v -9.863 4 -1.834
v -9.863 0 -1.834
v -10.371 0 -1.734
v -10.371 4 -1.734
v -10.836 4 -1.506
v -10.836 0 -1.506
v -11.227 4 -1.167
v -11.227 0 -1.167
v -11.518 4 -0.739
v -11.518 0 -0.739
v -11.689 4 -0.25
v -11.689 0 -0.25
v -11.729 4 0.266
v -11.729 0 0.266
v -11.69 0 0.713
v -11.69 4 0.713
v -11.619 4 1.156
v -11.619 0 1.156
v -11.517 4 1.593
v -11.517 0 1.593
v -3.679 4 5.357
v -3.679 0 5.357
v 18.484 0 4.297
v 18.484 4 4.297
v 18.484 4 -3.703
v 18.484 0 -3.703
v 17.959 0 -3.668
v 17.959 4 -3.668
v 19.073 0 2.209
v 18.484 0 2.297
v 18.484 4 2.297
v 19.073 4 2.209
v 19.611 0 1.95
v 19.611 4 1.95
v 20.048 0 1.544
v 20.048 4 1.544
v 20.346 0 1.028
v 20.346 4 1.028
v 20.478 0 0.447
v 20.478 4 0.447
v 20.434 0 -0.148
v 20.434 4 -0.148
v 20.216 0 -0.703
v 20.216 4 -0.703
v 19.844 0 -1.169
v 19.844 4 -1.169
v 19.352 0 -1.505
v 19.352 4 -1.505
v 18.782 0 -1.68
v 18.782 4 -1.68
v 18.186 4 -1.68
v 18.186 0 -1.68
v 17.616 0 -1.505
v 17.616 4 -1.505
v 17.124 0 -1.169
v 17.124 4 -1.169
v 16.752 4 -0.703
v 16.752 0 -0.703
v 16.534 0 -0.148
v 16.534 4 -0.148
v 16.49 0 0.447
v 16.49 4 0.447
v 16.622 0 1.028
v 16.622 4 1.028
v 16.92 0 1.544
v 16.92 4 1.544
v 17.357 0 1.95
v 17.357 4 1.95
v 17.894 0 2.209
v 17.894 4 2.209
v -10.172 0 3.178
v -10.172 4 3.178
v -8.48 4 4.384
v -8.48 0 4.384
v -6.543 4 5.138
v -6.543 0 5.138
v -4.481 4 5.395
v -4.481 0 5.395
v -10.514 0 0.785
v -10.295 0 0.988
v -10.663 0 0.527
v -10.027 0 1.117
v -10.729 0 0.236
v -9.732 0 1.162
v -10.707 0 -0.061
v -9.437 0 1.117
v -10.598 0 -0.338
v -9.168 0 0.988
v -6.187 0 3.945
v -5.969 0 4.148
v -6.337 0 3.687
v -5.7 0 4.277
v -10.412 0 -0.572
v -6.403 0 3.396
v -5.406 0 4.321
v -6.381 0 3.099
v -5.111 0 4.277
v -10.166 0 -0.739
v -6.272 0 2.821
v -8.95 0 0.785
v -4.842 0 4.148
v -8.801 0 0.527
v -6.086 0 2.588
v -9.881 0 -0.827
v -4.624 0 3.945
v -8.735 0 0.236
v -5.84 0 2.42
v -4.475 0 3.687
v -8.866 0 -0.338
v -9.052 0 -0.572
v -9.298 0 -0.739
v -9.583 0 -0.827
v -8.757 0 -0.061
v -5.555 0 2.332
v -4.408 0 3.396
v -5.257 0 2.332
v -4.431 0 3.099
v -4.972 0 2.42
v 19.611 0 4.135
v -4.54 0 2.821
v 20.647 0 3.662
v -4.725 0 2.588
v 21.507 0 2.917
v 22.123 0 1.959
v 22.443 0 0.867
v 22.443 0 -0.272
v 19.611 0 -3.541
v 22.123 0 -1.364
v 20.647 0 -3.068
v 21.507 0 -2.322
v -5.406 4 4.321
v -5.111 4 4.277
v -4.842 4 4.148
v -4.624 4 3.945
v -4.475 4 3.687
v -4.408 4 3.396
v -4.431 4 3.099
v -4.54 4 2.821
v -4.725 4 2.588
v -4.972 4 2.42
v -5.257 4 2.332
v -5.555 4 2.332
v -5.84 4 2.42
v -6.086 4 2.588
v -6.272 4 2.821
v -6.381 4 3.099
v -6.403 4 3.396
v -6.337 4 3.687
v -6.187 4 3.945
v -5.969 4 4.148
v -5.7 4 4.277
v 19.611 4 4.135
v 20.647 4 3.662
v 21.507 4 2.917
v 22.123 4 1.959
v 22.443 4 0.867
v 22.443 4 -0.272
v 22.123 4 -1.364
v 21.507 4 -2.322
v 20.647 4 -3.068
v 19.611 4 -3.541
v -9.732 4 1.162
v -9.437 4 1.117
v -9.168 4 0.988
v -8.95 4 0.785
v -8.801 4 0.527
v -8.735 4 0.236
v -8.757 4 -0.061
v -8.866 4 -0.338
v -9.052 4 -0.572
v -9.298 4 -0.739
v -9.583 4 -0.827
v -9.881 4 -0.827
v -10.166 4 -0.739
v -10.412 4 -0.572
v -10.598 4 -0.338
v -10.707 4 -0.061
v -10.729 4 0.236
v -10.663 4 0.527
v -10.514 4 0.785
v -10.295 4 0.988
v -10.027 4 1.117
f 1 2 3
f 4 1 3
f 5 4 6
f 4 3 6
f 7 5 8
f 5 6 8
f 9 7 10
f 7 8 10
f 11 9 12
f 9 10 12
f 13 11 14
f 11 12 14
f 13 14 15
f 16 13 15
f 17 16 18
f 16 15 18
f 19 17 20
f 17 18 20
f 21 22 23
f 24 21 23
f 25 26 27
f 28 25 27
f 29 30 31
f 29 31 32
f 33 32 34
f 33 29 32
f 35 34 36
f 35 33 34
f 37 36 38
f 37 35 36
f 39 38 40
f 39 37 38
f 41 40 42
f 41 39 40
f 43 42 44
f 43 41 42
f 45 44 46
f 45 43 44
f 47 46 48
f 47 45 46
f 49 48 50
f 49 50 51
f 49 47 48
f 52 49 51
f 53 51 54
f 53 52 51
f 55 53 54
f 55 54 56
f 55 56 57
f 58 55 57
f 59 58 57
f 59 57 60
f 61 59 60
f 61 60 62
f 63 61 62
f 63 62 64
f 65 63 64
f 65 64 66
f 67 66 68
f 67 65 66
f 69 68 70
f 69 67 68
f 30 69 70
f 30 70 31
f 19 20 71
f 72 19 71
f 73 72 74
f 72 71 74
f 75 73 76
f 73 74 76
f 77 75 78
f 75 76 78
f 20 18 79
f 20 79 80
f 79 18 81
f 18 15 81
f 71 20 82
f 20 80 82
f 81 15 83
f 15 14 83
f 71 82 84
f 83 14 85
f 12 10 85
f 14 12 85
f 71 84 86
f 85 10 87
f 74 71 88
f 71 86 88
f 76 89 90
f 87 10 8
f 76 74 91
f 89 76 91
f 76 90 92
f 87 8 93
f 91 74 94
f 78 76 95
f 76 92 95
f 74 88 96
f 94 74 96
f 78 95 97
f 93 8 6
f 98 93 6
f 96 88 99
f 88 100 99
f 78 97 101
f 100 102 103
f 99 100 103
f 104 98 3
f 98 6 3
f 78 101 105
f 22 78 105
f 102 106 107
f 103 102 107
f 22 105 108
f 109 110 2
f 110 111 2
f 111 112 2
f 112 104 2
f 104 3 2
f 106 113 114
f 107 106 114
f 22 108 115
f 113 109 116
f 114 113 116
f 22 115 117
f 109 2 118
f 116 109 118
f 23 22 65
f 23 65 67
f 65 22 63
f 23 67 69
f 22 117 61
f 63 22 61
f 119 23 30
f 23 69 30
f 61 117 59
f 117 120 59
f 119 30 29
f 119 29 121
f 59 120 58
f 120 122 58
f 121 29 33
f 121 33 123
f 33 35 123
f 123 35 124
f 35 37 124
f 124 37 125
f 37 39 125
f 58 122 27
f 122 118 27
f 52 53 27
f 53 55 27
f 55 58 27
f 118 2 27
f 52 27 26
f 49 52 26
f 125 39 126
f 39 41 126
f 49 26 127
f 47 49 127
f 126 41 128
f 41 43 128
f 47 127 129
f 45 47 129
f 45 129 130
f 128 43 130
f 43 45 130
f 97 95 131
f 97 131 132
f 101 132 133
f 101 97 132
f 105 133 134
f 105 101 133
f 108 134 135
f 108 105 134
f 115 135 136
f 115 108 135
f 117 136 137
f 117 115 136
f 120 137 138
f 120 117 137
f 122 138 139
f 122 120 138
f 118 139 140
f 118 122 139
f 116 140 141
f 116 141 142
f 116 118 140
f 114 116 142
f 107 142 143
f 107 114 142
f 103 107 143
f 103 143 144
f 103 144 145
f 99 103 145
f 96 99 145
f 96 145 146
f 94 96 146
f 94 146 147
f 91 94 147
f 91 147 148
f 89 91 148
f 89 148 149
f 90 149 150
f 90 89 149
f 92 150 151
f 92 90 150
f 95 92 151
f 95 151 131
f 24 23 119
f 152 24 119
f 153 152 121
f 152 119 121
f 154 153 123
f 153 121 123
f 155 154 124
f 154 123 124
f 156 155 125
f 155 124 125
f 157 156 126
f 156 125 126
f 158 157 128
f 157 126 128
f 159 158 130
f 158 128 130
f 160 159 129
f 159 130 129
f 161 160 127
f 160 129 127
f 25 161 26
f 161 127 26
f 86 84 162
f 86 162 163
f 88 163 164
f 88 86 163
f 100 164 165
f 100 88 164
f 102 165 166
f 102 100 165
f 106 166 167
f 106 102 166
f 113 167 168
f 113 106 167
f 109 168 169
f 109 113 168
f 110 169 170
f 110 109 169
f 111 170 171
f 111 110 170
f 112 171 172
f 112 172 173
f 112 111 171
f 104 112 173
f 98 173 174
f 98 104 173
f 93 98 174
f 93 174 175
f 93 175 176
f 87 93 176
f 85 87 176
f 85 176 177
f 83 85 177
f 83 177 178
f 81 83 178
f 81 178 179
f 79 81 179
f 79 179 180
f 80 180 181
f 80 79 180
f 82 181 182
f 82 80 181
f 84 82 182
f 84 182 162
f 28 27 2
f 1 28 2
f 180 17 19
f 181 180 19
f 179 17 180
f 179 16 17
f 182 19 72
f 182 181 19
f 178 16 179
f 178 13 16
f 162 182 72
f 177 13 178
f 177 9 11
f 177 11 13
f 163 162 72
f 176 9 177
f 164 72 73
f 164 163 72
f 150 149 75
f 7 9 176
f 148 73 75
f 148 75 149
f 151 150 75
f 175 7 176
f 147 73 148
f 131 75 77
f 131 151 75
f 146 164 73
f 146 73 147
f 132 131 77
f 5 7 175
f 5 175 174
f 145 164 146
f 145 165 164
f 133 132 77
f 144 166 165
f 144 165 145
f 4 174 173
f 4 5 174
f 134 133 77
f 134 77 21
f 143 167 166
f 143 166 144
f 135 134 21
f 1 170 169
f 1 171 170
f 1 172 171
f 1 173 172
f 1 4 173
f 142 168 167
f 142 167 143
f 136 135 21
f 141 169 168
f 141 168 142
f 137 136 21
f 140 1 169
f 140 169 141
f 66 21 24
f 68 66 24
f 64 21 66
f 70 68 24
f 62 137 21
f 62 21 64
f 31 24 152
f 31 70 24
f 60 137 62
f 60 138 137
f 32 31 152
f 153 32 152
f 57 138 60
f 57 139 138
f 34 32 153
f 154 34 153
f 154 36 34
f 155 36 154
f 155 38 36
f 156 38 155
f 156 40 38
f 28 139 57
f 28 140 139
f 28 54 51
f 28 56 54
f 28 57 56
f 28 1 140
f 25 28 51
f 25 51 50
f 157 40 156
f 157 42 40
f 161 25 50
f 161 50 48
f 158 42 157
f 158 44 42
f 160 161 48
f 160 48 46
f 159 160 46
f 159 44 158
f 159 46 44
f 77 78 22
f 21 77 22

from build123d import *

# Parameters (mm, degrees)
SKETCH2_R           = 1
SKETCH2_R_2         = 2
BOSS_EXTRUDE1_DEPTH = 4


with BuildPart() as part:
    # Sketch2 → Boss-Extrude1 (new body)
    with BuildSketch(Plane(origin=(0, 0, 0), x_dir=(1, 0, 0), z_dir=(0, 1, 0))):
        with BuildLine():
            ThreePointArc((-11.516754324, -1.593462652), (-8.479529409, -4.383974358), (-4.480887679, -5.395189011))
            Line((-4.480887679, -5.395189011), (-3.678548279, -5.356835657))
            Line((-3.678548279, -5.356835657), (18.483980616, -4.297424484))
            ThreePointArc((18.483980616, -4.297424484), (22.483980616, -0.297424484), (18.483980616, 3.702575516))
            Line((18.483980616, 3.702575516), (17.958963471, 3.667970452))
            Line((17.958963471, 3.667970452), (-9.863309787, 1.834141673))
            ThreePointArc((-9.863309787, 1.834141673), (-11.226928025, 1.166818548), (-11.729046011, -0.26588951))
            ThreePointArc((-11.729046011, -0.26588951), (-11.658234536, -0.935326386), (-11.516754324, -1.593462652))
        make_face()
        with Locations(Location((-5.405665929, -3.321328339, 0), (0, 0, 270))):
            Circle(SKETCH2_R, mode=Mode.SUBTRACT)
        with Locations(Location((-9.731770698, -0.161528006, 0), (0, 0, 270))):
            Circle(SKETCH2_R, mode=Mode.SUBTRACT)
        with Locations(Location((18.483980616, -0.297424484, 0), (0, 0, 270))):
            Circle(SKETCH2_R_2, mode=Mode.SUBTRACT)
    extrude(amount=BOSS_EXTRUDE1_DEPTH)


solid = part.part
